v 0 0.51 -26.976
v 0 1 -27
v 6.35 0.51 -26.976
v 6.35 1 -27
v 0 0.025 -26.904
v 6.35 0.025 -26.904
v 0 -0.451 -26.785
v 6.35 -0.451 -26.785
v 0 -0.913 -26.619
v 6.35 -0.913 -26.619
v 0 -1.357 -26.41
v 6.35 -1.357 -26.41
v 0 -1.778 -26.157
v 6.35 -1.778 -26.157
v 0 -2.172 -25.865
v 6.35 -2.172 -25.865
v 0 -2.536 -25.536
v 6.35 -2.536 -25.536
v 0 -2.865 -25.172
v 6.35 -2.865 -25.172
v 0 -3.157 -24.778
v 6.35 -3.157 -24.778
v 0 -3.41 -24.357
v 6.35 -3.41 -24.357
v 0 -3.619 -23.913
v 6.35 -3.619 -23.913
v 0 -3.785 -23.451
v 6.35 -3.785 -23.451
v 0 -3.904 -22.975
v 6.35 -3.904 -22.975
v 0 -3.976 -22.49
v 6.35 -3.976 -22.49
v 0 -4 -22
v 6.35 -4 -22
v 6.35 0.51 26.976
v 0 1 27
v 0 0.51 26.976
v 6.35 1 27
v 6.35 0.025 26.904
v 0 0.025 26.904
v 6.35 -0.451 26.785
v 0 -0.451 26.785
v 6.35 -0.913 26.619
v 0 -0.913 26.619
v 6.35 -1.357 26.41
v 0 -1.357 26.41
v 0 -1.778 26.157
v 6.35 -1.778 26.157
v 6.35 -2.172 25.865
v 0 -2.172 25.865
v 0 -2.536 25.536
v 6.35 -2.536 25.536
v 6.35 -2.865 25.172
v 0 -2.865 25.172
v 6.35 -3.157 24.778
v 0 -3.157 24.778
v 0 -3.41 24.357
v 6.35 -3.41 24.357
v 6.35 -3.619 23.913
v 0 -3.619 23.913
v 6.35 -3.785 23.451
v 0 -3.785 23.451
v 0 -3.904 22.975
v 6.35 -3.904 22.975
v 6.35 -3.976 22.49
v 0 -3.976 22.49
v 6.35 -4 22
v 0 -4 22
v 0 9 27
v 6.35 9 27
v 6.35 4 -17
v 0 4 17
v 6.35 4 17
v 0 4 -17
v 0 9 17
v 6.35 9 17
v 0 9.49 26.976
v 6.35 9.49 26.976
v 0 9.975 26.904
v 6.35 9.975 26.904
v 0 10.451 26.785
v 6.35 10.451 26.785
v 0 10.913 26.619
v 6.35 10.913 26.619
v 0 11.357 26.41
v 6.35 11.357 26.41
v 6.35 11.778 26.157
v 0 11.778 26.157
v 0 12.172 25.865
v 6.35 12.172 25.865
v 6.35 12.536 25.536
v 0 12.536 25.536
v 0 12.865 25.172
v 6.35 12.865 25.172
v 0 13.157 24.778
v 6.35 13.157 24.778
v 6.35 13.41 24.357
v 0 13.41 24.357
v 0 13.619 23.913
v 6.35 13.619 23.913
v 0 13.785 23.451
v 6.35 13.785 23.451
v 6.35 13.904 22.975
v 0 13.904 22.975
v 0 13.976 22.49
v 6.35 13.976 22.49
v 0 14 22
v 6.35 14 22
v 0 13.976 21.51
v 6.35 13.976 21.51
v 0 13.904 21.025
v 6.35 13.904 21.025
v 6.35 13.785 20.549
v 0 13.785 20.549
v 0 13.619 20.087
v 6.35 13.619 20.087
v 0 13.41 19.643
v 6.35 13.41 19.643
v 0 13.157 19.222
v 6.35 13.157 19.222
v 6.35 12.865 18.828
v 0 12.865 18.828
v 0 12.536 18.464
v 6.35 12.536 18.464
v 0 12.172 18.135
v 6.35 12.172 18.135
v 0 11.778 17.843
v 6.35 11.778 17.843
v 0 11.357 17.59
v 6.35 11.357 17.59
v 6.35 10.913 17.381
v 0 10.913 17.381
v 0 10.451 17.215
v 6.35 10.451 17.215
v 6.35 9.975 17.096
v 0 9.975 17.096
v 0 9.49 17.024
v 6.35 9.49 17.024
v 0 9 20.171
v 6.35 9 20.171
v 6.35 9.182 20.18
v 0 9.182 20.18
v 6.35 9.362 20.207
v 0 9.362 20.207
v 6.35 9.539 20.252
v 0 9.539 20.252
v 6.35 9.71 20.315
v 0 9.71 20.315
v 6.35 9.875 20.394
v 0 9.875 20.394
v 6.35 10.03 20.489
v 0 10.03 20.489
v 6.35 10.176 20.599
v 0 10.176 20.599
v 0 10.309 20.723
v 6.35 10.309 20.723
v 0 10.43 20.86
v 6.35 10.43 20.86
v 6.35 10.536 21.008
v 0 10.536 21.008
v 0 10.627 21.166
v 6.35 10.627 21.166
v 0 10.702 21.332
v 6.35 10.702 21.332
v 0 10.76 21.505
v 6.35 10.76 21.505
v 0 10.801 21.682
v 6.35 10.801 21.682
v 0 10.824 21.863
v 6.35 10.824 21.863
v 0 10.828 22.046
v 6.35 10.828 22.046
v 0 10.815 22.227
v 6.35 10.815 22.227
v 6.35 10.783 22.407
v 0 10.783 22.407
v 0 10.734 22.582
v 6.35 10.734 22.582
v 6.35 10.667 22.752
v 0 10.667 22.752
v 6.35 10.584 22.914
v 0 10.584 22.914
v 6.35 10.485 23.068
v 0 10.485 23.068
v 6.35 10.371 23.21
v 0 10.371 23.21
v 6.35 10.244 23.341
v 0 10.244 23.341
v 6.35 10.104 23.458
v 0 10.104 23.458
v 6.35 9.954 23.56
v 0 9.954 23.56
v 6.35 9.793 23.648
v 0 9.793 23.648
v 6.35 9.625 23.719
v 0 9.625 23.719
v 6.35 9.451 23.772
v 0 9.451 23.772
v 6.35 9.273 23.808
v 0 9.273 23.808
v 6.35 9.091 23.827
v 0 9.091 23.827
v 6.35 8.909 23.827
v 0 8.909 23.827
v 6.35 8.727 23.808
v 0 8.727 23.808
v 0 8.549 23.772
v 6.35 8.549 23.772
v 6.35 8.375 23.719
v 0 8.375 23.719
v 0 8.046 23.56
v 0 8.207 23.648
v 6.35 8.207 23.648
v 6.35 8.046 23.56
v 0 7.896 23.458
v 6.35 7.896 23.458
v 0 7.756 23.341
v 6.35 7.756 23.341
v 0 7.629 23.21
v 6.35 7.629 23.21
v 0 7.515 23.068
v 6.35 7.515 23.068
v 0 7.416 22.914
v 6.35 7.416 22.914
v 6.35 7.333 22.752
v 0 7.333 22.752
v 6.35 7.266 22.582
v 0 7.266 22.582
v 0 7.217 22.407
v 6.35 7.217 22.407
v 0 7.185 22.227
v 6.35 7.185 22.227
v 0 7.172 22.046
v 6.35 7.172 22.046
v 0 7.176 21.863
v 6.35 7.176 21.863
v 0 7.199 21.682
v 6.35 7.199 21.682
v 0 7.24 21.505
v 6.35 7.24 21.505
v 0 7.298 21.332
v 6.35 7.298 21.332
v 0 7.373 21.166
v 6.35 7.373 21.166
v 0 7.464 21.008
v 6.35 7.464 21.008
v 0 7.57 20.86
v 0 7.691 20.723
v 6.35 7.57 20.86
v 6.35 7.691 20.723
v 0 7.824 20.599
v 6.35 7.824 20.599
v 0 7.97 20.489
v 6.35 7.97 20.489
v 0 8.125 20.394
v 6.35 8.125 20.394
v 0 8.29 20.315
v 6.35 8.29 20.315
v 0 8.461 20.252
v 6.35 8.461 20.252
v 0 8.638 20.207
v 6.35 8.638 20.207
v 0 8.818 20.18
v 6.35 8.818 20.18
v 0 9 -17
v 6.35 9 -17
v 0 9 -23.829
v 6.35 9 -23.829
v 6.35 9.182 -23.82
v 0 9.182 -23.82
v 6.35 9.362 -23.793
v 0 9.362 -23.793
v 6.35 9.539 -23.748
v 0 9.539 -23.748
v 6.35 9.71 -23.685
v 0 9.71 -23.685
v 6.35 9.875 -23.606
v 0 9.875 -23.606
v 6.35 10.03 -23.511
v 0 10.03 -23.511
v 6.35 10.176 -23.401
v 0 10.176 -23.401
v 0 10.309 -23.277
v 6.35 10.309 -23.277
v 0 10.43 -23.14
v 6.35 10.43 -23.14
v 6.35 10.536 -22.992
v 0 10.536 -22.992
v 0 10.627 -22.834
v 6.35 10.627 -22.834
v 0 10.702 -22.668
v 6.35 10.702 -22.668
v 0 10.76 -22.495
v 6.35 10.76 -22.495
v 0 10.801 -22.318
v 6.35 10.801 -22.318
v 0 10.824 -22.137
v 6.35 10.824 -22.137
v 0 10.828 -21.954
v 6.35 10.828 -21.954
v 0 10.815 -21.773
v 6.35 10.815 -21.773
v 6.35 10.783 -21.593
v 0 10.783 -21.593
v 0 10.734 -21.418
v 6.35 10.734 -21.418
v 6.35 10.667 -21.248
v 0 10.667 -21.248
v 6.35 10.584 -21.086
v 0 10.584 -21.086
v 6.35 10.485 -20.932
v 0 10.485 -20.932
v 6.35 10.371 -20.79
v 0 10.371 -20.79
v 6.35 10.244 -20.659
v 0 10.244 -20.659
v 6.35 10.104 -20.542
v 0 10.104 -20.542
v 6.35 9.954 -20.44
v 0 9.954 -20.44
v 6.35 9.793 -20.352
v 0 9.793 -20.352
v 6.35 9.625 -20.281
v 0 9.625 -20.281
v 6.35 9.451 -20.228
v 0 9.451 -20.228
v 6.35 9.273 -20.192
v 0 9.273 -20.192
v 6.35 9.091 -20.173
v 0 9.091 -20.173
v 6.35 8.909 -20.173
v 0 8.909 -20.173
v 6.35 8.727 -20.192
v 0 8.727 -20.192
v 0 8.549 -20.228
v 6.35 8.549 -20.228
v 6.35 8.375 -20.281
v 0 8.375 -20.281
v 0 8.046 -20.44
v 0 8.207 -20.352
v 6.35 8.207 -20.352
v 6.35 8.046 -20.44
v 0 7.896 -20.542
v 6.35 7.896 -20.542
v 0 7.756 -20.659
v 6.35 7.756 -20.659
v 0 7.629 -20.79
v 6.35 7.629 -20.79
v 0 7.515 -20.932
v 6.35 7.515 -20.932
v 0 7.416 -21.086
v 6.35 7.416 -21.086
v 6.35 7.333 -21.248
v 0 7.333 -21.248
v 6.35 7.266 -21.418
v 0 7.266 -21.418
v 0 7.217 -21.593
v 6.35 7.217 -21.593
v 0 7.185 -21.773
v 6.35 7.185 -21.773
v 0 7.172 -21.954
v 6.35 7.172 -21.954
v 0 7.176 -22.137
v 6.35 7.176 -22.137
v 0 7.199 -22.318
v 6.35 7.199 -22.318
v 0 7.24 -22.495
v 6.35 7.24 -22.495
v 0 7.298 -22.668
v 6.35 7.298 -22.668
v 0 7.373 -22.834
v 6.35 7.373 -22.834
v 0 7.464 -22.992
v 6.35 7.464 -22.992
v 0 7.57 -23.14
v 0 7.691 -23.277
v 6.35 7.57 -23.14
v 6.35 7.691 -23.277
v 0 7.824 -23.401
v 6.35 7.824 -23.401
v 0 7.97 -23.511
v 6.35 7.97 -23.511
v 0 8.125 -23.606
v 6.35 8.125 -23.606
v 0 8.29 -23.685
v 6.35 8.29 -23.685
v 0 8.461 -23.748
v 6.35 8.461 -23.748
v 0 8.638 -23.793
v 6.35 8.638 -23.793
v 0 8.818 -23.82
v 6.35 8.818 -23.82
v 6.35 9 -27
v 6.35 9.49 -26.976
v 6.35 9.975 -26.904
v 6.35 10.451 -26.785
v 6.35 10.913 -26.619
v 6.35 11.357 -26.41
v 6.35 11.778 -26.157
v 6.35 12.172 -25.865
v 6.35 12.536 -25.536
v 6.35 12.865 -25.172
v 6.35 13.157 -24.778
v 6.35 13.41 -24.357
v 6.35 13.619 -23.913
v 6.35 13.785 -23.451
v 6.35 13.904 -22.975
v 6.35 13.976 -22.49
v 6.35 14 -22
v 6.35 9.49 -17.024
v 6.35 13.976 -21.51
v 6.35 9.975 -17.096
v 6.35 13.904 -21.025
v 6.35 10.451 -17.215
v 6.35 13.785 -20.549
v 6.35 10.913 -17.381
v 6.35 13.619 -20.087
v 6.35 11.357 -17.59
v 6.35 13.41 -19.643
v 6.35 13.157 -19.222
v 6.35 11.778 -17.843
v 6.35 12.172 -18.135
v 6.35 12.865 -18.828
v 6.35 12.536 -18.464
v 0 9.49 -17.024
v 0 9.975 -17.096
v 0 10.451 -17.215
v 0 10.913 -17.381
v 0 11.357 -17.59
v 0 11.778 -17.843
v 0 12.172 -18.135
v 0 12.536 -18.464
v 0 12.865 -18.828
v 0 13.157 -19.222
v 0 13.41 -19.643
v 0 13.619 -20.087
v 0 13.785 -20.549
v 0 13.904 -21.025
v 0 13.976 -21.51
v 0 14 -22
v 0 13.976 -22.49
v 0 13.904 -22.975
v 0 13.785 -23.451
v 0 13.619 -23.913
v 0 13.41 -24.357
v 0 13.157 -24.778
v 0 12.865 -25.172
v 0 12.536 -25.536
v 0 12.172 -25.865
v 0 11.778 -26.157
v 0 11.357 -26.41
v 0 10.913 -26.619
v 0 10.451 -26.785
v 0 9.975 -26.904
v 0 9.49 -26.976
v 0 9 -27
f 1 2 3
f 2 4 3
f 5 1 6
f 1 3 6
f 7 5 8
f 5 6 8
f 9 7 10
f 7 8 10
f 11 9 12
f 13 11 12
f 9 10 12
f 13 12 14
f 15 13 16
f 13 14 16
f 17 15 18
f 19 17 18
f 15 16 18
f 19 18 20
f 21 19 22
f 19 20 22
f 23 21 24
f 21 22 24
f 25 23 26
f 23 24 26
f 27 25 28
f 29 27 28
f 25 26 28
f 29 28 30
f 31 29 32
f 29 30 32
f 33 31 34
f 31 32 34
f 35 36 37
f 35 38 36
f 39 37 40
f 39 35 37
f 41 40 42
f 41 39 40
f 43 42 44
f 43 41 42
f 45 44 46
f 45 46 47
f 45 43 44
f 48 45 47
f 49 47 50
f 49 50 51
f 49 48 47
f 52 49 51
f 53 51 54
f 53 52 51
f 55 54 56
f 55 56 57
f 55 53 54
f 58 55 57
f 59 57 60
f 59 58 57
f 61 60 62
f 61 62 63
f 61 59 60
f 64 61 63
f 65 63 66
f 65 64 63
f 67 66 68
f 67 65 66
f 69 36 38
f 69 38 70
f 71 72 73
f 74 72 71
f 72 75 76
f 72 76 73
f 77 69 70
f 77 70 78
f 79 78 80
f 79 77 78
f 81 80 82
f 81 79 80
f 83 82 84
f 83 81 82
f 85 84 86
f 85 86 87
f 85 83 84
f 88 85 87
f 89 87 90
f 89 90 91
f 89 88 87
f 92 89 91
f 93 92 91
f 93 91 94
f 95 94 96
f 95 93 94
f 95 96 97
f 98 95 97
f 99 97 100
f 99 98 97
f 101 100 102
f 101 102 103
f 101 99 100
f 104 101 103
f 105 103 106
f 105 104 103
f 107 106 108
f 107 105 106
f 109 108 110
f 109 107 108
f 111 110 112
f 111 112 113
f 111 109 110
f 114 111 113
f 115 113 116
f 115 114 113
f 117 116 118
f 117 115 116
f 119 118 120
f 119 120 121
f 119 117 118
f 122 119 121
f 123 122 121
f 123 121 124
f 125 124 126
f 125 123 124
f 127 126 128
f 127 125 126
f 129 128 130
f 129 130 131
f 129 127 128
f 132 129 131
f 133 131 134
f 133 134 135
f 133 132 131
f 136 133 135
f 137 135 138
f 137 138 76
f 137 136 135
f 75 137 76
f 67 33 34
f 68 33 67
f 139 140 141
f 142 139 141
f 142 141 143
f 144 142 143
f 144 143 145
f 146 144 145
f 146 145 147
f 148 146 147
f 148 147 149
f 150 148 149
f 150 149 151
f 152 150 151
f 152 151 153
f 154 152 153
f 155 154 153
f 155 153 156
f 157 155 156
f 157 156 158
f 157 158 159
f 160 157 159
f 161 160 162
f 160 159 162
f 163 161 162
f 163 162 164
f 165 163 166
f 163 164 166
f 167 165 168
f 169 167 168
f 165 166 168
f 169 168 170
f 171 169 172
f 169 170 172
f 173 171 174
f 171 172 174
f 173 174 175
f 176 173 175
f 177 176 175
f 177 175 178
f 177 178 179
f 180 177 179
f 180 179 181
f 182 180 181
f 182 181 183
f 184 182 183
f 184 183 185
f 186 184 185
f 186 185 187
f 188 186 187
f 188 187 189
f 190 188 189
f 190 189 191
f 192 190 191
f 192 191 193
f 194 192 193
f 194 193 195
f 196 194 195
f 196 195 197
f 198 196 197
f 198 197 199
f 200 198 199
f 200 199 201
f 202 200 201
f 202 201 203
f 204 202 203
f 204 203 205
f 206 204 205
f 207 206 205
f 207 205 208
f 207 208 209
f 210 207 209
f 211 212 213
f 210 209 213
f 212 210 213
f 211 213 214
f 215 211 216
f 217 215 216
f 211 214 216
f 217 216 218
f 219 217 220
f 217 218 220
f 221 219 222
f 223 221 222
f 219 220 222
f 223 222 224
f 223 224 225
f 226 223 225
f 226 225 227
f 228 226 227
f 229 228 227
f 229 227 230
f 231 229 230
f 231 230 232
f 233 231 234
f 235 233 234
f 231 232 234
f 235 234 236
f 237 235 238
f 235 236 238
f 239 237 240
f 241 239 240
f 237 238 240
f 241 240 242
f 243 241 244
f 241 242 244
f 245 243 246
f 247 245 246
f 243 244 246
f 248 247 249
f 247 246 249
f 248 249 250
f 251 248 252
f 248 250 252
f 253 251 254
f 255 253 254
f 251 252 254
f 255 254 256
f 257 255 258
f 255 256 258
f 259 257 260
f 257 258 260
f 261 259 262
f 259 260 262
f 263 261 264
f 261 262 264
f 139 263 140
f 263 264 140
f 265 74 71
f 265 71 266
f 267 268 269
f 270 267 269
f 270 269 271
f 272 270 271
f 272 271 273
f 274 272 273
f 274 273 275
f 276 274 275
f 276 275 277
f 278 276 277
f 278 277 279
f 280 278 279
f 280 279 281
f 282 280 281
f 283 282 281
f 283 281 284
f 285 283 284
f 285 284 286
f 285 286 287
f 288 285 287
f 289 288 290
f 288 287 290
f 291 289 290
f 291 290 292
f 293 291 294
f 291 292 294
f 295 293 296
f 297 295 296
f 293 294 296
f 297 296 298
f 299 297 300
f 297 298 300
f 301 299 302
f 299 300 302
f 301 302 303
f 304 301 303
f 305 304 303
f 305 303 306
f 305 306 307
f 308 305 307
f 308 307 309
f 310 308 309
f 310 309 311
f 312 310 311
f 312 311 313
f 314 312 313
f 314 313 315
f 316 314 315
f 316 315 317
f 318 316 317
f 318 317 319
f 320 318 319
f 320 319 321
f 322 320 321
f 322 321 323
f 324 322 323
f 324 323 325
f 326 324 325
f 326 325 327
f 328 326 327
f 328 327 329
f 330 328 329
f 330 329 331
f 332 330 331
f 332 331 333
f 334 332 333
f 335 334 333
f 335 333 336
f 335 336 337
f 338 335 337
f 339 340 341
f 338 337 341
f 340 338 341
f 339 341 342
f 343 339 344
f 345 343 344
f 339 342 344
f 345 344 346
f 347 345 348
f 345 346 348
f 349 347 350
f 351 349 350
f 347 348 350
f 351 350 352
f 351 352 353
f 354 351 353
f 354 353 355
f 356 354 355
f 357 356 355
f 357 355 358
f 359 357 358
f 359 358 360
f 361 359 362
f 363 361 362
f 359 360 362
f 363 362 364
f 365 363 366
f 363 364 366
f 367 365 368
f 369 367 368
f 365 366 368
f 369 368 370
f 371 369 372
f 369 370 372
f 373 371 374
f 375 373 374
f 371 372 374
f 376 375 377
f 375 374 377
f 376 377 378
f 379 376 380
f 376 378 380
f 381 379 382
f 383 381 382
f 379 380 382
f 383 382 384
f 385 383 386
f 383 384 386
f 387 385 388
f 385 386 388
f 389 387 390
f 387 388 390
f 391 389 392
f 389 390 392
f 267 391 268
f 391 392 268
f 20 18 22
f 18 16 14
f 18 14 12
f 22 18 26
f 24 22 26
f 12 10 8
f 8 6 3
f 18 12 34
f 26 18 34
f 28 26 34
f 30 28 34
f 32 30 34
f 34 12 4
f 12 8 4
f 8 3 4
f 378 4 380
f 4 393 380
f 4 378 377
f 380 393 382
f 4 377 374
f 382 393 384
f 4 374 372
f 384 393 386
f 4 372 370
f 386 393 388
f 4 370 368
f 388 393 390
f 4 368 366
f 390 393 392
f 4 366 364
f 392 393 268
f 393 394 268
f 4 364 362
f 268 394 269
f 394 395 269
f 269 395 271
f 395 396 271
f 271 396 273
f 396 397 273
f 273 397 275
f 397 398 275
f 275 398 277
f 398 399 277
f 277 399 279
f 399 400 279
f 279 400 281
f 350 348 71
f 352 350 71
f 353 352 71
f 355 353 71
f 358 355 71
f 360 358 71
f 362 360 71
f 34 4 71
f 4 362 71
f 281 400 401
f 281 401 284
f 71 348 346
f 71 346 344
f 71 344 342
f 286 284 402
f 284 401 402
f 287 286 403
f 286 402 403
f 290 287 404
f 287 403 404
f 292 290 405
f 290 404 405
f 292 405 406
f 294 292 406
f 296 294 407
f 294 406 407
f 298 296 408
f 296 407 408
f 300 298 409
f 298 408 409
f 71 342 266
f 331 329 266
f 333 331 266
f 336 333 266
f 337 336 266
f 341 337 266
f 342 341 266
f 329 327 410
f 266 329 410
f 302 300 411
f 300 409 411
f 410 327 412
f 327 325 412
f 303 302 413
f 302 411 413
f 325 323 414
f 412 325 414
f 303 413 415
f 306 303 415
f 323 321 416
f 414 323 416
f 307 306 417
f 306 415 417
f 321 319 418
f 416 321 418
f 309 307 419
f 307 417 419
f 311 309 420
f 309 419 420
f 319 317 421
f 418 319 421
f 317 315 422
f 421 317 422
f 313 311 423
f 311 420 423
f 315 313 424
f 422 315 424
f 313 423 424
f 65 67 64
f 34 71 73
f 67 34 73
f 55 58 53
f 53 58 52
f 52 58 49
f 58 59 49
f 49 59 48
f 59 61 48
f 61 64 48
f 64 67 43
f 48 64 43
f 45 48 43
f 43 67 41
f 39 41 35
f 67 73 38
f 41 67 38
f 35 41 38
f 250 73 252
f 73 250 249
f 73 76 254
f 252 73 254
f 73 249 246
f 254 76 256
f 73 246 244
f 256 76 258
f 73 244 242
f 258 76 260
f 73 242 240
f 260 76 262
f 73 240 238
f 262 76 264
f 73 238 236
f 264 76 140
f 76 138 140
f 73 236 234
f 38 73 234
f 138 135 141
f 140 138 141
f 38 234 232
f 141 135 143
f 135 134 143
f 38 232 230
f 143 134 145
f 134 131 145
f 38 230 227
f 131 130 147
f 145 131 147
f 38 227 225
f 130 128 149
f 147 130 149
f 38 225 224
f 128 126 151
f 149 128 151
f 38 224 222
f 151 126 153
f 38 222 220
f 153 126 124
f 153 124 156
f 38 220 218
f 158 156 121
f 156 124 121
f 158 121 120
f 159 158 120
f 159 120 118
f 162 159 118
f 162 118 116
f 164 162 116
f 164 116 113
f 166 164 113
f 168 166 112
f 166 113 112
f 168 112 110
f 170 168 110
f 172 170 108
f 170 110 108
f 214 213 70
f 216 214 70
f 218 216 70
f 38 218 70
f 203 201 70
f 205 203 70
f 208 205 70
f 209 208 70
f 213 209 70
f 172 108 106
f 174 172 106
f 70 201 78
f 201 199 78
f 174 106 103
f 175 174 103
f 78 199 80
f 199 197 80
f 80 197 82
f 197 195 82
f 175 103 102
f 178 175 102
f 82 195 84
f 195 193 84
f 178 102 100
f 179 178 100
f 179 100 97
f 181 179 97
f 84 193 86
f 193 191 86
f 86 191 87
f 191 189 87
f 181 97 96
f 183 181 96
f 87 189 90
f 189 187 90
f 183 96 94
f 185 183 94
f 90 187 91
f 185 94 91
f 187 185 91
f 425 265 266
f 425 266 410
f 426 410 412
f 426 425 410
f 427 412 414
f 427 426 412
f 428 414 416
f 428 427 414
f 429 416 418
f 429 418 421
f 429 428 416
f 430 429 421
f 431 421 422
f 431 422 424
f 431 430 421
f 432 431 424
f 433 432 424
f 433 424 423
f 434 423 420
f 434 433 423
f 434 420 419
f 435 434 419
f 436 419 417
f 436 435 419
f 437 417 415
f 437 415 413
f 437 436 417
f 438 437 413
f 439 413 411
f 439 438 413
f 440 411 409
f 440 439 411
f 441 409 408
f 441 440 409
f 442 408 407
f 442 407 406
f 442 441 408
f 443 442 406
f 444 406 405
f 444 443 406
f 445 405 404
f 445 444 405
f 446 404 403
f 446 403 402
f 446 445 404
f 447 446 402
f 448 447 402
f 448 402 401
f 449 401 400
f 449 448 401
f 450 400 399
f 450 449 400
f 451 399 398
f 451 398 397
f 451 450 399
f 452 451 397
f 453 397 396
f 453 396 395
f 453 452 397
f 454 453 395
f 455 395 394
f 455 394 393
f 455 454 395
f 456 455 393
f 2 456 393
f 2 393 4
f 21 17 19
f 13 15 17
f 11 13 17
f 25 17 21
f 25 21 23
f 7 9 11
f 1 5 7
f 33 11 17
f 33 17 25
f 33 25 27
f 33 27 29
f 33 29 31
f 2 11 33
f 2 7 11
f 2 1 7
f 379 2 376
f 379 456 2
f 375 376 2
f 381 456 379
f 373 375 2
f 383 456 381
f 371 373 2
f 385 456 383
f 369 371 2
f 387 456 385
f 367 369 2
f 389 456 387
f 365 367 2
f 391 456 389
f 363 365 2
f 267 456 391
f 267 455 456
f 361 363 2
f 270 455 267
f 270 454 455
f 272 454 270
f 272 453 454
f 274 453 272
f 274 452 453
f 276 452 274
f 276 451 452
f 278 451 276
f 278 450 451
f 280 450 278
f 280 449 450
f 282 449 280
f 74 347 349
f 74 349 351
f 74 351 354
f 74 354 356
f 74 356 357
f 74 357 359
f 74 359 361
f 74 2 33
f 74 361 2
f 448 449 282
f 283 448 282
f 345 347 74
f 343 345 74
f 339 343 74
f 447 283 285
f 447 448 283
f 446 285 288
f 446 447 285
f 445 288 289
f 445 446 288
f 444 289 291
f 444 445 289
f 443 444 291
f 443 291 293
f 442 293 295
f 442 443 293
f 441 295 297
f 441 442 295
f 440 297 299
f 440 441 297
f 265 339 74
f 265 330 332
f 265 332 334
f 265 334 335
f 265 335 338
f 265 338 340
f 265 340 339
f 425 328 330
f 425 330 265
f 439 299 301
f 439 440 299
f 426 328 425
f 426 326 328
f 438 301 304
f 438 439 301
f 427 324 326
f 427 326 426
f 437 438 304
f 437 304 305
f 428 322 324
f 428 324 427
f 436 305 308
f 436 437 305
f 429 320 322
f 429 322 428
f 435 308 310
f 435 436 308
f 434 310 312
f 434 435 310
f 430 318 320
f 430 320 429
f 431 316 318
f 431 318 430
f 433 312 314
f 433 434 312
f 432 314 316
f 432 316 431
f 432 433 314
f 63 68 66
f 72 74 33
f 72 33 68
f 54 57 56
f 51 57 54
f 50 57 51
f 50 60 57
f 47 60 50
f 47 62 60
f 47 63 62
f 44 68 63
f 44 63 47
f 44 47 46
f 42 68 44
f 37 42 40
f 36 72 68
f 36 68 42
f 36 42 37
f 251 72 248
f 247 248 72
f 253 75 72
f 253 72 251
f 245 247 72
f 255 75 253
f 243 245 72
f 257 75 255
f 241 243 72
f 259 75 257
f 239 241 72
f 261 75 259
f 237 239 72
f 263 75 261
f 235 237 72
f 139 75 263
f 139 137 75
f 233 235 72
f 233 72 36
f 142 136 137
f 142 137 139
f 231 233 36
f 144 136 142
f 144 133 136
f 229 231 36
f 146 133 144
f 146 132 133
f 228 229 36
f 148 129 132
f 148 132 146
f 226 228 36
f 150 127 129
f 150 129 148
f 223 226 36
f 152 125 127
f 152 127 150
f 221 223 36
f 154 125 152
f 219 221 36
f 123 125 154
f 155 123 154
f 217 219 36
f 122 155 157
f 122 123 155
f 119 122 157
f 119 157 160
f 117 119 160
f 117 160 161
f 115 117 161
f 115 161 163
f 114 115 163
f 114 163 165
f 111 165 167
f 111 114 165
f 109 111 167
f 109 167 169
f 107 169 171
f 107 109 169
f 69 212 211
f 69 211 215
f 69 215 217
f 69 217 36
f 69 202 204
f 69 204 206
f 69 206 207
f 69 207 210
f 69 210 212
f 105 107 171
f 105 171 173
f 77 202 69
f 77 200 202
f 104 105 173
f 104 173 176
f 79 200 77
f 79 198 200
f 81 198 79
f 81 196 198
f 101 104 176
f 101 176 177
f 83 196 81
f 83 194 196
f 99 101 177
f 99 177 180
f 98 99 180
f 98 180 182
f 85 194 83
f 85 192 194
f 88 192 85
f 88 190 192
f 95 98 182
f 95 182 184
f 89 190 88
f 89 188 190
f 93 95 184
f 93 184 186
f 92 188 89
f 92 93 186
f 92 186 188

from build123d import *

# Parameters (mm, degrees)
BOSS_EXTRUDE1_DEPTH   = 6.35
FILLET1_R             = 5
F_6_CLEARANCE_HOLE1_D = 3.6576


with BuildPart() as part:
    # Sketch1 → Boss-Extrude1 (new body)
    with BuildSketch(Plane(origin=(0, 0, 0), x_dir=(0, 0, -1), z_dir=(1, 0, 0))):
        with BuildLine():
            Line((-27, -4), (-27, 4))
            Line((-27, 4), (-27, 9))
            ThreePointArc((-27, 9), (-22, 14), (-17, 9))
            Line((-17, 9), (-17, 4))
            Line((-17, 4), (17, 4))
            Line((17, 4), (17, 9))
            ThreePointArc((17, 9), (22, 14), (27, 9))
            Line((27, 9), (27, 4))
            Line((27, 4), (27, -4))
            Line((27, -4), (-27, -4))
        make_face()
    extrude(amount=BOSS_EXTRUDE1_DEPTH)

    # Fillet1
    fillet1_edges = [part.edges().sort_by_distance(p)[0] for p in [
        (3.175, -4, -27),
        (3.175, -4, 27),
    ]]
    fillet(fillet1_edges, radius=FILLET1_R)

    # #6 Clearance Hole1 (through all)
    with Locations(Plane.ZY):
        with Locations((-22, 9), (22, 9)):
            Hole(F_6_CLEARANCE_HOLE1_D / 2)


solid = part.part
